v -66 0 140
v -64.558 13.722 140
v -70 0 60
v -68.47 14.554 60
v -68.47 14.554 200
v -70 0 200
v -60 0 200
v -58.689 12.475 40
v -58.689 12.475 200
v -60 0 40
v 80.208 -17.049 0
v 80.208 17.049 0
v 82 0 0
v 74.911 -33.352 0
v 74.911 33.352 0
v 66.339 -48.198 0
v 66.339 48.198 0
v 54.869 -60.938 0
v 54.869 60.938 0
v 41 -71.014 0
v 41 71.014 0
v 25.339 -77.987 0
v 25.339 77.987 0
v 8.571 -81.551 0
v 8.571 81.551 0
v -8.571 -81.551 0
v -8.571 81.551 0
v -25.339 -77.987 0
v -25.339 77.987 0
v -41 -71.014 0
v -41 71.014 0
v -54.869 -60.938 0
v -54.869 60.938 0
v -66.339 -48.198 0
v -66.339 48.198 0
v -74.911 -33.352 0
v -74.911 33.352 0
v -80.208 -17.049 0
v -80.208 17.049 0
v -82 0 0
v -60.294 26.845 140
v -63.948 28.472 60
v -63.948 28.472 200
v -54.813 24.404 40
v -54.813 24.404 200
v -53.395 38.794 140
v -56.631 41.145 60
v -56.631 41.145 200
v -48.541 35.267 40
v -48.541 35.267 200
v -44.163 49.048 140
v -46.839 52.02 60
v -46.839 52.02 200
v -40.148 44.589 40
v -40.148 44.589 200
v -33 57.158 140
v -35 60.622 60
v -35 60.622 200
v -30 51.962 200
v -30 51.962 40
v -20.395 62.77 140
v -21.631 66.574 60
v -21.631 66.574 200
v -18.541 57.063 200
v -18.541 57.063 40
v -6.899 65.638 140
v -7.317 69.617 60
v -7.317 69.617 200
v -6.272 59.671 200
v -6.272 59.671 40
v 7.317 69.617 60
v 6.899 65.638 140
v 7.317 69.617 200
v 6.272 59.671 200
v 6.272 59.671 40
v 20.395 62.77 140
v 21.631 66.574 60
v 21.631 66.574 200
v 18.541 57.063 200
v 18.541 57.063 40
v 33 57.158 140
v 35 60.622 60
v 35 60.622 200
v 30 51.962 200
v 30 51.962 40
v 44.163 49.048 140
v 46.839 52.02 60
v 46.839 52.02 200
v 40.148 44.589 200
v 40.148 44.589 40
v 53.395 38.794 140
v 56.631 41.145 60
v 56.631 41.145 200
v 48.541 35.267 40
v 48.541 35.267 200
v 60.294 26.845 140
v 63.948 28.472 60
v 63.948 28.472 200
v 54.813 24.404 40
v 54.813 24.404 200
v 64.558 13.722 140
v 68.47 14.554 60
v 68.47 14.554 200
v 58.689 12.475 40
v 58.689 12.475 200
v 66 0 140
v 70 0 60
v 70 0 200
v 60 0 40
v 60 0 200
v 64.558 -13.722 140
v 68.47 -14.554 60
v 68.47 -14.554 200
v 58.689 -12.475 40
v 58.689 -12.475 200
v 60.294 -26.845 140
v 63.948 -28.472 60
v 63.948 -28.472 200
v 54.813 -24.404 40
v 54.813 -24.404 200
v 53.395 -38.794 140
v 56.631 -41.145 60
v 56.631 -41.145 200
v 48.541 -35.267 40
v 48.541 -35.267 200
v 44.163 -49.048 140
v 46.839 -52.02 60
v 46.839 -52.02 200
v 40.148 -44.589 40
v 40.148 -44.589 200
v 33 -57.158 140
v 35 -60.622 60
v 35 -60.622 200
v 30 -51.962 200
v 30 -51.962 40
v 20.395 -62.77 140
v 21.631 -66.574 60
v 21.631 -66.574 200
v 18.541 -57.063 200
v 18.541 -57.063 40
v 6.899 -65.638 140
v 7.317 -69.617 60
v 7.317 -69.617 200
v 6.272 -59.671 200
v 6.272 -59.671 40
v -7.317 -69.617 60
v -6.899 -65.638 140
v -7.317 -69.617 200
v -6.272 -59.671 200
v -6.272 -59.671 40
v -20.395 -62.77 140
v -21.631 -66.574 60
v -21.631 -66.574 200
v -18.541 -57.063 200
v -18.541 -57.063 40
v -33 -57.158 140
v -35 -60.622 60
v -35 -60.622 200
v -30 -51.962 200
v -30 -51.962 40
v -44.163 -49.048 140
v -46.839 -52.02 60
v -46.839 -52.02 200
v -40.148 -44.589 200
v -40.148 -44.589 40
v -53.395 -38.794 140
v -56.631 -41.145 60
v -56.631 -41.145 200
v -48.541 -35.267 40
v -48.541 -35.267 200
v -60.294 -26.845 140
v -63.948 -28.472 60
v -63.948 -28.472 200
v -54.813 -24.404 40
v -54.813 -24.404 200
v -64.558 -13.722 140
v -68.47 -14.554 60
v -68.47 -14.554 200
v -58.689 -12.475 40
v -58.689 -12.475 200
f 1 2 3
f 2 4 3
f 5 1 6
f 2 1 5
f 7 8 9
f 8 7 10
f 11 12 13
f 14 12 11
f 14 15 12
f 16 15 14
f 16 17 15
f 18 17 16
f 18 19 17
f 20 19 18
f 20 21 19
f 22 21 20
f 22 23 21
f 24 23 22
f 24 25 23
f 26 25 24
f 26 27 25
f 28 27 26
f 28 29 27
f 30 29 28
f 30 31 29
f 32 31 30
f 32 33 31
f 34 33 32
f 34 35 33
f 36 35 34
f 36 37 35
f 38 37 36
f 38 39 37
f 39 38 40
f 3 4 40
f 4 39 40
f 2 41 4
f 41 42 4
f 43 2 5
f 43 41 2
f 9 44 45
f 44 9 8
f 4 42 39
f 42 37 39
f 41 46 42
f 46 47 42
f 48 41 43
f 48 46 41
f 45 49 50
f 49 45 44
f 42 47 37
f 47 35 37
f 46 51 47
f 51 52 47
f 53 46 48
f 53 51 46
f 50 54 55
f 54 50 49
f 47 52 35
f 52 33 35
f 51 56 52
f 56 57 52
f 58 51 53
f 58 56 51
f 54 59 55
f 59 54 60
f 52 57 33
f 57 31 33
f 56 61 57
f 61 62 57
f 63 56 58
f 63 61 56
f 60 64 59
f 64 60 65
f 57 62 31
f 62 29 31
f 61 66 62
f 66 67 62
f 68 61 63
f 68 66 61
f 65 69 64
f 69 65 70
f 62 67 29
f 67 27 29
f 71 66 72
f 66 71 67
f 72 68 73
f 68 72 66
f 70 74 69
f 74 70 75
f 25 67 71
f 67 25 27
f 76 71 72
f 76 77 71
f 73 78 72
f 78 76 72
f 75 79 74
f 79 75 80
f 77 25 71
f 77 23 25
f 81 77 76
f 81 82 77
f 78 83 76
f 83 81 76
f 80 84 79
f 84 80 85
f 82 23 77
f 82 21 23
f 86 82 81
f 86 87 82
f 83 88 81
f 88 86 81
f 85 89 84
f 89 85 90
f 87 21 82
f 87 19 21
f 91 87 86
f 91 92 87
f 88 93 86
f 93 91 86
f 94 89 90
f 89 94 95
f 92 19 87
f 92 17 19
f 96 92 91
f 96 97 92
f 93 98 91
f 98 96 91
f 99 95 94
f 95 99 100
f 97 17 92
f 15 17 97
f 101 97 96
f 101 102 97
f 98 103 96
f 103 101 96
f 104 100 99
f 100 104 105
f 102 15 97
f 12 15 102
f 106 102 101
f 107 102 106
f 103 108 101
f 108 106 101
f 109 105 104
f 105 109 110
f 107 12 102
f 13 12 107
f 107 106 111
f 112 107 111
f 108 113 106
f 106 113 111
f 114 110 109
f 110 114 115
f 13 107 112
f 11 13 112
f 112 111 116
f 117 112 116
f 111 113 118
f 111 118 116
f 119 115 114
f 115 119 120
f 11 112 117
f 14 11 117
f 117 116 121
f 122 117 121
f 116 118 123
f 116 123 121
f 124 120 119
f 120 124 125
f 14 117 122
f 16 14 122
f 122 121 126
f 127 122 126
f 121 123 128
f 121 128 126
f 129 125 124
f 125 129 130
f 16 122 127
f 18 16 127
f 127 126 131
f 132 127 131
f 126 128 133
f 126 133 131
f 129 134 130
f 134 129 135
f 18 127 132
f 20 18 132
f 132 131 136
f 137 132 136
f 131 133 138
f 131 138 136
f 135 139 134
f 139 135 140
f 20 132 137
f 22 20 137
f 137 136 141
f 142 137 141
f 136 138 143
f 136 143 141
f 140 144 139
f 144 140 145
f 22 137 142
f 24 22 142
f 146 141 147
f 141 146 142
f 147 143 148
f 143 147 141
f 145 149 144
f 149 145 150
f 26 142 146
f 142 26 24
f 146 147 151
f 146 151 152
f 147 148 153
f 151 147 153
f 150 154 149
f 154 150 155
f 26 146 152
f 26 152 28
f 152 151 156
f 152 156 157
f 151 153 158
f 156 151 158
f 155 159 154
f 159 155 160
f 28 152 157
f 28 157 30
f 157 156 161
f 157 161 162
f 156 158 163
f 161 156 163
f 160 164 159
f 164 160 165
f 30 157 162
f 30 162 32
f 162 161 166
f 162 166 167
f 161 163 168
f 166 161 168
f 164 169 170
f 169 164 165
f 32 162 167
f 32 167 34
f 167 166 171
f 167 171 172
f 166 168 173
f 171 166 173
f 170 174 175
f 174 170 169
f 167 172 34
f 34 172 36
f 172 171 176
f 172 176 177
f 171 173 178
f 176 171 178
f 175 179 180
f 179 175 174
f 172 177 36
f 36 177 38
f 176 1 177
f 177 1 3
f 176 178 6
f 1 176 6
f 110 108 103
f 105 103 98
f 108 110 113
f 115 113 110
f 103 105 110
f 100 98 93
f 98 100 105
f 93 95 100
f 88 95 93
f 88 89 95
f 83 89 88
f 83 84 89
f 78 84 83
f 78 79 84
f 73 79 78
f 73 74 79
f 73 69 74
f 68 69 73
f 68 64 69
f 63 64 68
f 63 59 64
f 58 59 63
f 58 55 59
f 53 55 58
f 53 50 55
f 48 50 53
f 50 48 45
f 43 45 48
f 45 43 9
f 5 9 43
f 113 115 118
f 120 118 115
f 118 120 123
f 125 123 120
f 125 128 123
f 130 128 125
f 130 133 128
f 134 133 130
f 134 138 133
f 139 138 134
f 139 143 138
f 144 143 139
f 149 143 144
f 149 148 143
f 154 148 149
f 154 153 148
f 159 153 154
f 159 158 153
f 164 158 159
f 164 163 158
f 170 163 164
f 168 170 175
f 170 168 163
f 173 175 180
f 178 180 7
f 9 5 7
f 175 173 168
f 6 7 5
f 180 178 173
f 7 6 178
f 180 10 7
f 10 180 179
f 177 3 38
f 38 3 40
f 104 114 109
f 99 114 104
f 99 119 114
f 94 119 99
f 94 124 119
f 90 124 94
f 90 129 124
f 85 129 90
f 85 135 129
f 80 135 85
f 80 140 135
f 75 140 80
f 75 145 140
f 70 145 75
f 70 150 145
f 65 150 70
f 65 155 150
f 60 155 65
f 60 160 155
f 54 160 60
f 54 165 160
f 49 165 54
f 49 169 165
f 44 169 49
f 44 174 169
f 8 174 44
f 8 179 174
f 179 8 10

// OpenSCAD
color([0.3,0.3,0.3]);
scale = 20;
rotate_extrude(convexity = 10)
translate([3*scale,0,0])
polygon([[0,0],[1.1*scale,0],[0.5*scale,3*scale],[0.3*scale,7*scale],[0.5*scale,10*scale],[0,10*scale]]);
cylinder(h=2*scale, r=3*scale);
